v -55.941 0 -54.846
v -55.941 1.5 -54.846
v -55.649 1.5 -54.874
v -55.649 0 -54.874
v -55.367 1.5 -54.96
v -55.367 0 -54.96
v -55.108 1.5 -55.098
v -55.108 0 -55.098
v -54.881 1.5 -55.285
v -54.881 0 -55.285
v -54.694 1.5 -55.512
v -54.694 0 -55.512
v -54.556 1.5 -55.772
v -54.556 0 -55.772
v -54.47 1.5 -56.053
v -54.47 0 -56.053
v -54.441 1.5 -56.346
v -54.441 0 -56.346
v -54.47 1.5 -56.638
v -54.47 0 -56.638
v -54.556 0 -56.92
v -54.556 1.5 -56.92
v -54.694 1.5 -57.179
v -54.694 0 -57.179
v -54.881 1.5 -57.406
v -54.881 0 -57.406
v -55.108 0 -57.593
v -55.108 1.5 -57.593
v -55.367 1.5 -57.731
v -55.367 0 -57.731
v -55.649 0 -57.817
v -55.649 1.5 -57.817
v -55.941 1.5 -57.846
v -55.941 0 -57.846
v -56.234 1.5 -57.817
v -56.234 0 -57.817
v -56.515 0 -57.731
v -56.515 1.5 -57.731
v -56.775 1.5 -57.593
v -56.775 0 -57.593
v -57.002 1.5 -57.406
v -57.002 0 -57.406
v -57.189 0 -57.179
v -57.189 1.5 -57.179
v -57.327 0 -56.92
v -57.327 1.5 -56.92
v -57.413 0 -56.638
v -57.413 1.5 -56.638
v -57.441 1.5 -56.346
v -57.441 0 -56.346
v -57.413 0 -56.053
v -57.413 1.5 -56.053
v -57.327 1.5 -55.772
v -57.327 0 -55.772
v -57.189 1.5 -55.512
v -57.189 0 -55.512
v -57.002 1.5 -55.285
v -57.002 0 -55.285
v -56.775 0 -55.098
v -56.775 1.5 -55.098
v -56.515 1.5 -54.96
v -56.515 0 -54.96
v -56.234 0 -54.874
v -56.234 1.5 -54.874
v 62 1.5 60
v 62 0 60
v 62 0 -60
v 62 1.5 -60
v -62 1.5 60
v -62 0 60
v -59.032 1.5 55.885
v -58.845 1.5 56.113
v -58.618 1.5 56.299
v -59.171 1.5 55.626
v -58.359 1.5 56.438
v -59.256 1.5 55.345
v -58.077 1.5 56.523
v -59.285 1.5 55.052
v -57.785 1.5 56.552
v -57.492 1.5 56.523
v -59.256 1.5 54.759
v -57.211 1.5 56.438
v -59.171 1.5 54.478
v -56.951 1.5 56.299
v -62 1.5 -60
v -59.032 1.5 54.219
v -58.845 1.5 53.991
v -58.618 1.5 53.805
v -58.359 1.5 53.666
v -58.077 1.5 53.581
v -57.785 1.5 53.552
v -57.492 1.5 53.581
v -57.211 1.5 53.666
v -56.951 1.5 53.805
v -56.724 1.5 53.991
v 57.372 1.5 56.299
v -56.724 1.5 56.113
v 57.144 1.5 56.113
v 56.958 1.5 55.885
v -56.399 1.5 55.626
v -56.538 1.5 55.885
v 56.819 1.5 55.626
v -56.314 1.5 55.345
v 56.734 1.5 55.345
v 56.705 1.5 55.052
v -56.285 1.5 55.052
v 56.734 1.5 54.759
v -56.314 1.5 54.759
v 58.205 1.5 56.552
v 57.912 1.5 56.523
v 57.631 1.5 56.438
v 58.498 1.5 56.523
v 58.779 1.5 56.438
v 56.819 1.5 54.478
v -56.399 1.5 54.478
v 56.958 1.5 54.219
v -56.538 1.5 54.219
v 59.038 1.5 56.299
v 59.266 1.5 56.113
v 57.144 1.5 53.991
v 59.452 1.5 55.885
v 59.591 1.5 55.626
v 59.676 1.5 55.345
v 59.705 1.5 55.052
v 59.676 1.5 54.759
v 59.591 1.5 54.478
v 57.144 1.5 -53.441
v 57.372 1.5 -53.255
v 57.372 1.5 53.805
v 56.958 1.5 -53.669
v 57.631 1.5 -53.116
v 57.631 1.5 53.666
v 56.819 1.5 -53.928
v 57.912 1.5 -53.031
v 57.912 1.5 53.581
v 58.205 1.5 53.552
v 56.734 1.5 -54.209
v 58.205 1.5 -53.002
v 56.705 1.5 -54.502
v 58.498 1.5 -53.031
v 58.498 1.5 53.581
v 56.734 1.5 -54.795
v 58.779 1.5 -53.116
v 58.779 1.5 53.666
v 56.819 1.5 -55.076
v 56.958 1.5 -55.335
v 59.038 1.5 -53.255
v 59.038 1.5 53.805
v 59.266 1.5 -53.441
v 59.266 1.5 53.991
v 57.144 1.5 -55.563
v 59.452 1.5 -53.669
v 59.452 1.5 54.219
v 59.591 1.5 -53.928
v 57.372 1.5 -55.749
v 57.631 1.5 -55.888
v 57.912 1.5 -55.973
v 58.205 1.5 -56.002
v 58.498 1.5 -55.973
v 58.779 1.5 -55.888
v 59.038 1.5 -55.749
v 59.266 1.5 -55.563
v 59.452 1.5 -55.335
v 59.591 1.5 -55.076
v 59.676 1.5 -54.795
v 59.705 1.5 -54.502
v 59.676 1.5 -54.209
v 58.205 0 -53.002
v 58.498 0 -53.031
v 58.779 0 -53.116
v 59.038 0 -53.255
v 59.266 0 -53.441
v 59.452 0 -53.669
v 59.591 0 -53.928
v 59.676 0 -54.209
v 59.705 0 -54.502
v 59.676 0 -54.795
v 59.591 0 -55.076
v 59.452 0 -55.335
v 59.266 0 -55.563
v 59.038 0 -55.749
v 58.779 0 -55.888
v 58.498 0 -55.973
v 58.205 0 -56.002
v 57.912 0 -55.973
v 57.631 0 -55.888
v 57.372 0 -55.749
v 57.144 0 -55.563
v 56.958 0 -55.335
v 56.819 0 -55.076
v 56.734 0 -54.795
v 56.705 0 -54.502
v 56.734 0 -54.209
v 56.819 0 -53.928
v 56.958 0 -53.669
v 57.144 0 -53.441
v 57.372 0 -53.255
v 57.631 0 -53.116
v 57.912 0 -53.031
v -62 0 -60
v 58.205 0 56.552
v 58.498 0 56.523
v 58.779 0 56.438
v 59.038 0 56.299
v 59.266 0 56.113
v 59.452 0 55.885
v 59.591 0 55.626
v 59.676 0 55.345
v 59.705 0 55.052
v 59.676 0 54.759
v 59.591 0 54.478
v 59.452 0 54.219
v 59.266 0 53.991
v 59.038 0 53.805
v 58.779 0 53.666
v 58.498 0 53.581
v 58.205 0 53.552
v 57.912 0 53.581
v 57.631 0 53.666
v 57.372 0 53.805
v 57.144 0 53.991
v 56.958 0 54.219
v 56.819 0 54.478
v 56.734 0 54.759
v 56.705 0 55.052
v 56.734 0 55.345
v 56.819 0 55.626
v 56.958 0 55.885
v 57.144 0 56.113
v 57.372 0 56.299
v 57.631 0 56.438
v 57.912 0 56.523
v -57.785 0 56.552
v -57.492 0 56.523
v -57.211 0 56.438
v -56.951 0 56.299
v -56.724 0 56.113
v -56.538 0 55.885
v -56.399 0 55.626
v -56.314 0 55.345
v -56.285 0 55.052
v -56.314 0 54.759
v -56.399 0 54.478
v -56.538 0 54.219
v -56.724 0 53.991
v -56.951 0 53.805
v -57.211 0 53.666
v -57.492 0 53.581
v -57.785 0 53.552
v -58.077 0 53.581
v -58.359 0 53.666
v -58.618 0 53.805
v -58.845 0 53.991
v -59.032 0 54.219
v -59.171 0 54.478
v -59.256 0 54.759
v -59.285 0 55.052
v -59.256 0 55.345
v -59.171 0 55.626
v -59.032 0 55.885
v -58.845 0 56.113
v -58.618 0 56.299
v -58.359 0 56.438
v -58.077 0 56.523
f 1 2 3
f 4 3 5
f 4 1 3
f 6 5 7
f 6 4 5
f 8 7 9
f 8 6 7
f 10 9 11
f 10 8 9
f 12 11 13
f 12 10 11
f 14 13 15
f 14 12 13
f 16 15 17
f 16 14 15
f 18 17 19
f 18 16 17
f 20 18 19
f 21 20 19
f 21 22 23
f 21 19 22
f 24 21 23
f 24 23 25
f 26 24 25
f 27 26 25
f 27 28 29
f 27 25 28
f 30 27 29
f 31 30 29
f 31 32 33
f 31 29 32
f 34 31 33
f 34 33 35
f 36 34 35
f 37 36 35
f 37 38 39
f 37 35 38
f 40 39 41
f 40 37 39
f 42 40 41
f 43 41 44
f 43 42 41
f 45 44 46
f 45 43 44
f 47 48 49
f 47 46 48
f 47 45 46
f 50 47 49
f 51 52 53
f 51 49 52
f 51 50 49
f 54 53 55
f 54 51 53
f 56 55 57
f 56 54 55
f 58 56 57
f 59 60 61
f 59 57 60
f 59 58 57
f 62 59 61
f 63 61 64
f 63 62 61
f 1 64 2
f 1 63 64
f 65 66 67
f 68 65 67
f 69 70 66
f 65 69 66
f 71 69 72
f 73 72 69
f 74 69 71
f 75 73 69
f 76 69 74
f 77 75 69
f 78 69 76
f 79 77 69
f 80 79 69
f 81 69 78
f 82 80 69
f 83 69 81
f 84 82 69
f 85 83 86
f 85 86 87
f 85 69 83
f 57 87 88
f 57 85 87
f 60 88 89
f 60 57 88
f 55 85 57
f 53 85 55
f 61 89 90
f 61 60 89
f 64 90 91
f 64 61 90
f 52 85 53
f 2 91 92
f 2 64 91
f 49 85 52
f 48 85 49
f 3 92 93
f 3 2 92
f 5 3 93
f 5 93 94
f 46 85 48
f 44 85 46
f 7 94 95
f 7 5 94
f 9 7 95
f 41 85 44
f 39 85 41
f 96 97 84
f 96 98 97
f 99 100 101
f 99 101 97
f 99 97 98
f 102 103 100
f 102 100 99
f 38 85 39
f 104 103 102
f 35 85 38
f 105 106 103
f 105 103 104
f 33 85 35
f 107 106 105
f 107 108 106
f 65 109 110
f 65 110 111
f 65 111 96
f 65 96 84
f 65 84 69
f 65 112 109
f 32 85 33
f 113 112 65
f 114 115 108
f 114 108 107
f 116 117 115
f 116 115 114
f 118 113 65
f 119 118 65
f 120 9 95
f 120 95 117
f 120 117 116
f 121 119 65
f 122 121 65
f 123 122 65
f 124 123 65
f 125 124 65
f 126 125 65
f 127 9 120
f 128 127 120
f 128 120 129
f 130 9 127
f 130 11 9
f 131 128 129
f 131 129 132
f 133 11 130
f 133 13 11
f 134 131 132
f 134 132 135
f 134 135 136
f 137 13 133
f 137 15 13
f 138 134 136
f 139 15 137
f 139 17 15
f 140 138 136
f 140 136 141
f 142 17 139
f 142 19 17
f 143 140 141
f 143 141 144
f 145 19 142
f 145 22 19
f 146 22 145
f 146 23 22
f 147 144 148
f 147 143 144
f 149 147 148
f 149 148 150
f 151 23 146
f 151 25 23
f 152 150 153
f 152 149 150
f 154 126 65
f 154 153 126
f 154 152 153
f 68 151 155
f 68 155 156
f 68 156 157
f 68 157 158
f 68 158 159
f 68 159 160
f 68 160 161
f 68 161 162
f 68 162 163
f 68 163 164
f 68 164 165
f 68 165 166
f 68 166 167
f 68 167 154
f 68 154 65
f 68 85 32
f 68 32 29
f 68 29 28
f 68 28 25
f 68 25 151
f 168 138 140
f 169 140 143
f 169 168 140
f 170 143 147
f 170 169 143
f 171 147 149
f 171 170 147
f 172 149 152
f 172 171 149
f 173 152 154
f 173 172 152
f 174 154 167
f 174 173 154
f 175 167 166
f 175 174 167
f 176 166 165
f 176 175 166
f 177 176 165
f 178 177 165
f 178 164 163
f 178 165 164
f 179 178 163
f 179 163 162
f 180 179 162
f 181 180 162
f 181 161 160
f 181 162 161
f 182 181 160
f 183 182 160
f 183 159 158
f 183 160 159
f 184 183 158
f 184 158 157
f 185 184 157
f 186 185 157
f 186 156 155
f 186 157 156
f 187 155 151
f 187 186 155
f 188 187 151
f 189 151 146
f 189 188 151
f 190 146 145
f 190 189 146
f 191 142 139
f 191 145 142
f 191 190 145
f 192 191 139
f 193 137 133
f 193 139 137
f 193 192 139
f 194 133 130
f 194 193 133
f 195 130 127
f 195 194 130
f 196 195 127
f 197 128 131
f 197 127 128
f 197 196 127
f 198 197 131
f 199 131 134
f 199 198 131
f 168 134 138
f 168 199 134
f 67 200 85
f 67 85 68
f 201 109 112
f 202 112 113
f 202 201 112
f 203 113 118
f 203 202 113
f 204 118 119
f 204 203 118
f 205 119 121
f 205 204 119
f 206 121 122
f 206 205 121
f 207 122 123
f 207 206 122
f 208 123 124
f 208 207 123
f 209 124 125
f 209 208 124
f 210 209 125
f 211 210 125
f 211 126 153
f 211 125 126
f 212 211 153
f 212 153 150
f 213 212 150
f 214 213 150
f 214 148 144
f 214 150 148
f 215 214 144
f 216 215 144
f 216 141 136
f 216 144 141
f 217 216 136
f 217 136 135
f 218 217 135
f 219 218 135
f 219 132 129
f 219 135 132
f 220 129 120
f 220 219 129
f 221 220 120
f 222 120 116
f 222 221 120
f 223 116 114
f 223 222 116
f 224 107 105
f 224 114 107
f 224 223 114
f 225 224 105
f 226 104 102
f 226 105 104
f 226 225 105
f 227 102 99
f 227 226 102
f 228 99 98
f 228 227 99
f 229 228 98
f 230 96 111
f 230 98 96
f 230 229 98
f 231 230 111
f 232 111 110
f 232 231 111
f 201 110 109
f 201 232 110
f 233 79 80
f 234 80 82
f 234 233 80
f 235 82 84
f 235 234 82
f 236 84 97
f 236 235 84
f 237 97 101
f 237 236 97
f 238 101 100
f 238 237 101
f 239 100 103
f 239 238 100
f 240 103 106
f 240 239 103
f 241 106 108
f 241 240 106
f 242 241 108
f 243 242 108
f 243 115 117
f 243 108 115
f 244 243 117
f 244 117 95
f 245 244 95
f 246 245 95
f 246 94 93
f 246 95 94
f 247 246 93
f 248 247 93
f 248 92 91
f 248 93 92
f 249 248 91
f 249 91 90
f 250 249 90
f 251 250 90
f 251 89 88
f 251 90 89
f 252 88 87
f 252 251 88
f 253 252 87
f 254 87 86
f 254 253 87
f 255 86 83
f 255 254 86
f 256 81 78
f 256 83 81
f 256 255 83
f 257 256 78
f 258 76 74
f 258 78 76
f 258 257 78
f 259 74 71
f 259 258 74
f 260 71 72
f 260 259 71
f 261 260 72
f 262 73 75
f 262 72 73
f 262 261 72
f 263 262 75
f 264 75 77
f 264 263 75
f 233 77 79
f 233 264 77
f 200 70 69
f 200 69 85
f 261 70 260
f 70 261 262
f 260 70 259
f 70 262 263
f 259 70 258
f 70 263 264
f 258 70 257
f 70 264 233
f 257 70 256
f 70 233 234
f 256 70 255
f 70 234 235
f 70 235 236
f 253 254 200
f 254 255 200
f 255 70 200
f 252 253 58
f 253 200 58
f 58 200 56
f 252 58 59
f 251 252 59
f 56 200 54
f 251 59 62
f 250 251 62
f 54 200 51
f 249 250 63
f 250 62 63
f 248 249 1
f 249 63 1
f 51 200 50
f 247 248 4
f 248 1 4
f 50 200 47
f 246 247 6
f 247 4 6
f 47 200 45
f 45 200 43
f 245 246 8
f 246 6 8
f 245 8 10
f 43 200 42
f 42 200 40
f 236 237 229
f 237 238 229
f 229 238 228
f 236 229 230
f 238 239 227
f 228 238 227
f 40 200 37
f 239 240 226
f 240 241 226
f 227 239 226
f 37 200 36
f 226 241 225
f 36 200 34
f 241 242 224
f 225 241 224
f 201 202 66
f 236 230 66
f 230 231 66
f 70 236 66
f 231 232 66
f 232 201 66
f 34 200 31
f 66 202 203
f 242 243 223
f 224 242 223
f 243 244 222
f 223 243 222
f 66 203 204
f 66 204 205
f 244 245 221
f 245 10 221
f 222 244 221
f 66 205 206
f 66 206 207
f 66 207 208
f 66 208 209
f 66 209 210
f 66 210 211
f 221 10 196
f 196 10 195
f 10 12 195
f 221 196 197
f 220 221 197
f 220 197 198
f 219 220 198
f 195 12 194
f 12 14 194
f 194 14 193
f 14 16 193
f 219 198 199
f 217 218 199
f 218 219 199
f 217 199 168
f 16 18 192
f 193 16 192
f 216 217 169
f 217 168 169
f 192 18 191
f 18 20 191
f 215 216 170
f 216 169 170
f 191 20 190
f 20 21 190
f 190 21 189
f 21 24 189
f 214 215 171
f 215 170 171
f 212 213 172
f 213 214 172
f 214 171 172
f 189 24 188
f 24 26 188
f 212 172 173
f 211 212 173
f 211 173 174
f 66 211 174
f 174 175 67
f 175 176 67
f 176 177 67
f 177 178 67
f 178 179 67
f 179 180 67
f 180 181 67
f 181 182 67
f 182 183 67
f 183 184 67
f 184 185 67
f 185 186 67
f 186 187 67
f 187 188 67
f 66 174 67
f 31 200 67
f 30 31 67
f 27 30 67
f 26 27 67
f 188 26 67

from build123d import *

# Parameters (mm, degrees)
SKETCH1_W           = 124
SKETCH1_H           = 120
BOSS_EXTRUDE1_DEPTH = 1.5
SKETCH2_R           = 1.5
CUT_EXTRUDE7_DEPTH  = 8.5


with BuildPart() as part:
    # Sketch1 → Boss-Extrude1 (new body)
    with BuildSketch(Plane(origin=(0, 0, 0), x_dir=(1, 0, 0), z_dir=(0, 1, 0))):
        Rectangle(SKETCH1_W, SKETCH1_H)
    extrude(amount=BOSS_EXTRUDE1_DEPTH)

    # Sketch2 → Cut-Extrude7 (cut)
    with BuildSketch(Plane(origin=(0, 0, 0), x_dir=(1, 0, 0), z_dir=(0, 1, 0))):
        with Locations(Location((-55.941350506, 56.345551016, 0), (0, 0, 270))):
            Circle(SKETCH2_R)
        with Locations(Location((58.204873359, 54.502113065, 0), (0, 0, 270))):
            Circle(SKETCH2_R)
        with Locations(Location((-57.784788457, -55.052109385, 0), (0, 0, 270))):
            Circle(SKETCH2_R)
        with Locations(Location((58.204873359, -55.052109385, 0), (0, 0, 270))):
            Circle(SKETCH2_R)
    extrude(amount=CUT_EXTRUDE7_DEPTH, mode=Mode.SUBTRACT)


solid = part.part
